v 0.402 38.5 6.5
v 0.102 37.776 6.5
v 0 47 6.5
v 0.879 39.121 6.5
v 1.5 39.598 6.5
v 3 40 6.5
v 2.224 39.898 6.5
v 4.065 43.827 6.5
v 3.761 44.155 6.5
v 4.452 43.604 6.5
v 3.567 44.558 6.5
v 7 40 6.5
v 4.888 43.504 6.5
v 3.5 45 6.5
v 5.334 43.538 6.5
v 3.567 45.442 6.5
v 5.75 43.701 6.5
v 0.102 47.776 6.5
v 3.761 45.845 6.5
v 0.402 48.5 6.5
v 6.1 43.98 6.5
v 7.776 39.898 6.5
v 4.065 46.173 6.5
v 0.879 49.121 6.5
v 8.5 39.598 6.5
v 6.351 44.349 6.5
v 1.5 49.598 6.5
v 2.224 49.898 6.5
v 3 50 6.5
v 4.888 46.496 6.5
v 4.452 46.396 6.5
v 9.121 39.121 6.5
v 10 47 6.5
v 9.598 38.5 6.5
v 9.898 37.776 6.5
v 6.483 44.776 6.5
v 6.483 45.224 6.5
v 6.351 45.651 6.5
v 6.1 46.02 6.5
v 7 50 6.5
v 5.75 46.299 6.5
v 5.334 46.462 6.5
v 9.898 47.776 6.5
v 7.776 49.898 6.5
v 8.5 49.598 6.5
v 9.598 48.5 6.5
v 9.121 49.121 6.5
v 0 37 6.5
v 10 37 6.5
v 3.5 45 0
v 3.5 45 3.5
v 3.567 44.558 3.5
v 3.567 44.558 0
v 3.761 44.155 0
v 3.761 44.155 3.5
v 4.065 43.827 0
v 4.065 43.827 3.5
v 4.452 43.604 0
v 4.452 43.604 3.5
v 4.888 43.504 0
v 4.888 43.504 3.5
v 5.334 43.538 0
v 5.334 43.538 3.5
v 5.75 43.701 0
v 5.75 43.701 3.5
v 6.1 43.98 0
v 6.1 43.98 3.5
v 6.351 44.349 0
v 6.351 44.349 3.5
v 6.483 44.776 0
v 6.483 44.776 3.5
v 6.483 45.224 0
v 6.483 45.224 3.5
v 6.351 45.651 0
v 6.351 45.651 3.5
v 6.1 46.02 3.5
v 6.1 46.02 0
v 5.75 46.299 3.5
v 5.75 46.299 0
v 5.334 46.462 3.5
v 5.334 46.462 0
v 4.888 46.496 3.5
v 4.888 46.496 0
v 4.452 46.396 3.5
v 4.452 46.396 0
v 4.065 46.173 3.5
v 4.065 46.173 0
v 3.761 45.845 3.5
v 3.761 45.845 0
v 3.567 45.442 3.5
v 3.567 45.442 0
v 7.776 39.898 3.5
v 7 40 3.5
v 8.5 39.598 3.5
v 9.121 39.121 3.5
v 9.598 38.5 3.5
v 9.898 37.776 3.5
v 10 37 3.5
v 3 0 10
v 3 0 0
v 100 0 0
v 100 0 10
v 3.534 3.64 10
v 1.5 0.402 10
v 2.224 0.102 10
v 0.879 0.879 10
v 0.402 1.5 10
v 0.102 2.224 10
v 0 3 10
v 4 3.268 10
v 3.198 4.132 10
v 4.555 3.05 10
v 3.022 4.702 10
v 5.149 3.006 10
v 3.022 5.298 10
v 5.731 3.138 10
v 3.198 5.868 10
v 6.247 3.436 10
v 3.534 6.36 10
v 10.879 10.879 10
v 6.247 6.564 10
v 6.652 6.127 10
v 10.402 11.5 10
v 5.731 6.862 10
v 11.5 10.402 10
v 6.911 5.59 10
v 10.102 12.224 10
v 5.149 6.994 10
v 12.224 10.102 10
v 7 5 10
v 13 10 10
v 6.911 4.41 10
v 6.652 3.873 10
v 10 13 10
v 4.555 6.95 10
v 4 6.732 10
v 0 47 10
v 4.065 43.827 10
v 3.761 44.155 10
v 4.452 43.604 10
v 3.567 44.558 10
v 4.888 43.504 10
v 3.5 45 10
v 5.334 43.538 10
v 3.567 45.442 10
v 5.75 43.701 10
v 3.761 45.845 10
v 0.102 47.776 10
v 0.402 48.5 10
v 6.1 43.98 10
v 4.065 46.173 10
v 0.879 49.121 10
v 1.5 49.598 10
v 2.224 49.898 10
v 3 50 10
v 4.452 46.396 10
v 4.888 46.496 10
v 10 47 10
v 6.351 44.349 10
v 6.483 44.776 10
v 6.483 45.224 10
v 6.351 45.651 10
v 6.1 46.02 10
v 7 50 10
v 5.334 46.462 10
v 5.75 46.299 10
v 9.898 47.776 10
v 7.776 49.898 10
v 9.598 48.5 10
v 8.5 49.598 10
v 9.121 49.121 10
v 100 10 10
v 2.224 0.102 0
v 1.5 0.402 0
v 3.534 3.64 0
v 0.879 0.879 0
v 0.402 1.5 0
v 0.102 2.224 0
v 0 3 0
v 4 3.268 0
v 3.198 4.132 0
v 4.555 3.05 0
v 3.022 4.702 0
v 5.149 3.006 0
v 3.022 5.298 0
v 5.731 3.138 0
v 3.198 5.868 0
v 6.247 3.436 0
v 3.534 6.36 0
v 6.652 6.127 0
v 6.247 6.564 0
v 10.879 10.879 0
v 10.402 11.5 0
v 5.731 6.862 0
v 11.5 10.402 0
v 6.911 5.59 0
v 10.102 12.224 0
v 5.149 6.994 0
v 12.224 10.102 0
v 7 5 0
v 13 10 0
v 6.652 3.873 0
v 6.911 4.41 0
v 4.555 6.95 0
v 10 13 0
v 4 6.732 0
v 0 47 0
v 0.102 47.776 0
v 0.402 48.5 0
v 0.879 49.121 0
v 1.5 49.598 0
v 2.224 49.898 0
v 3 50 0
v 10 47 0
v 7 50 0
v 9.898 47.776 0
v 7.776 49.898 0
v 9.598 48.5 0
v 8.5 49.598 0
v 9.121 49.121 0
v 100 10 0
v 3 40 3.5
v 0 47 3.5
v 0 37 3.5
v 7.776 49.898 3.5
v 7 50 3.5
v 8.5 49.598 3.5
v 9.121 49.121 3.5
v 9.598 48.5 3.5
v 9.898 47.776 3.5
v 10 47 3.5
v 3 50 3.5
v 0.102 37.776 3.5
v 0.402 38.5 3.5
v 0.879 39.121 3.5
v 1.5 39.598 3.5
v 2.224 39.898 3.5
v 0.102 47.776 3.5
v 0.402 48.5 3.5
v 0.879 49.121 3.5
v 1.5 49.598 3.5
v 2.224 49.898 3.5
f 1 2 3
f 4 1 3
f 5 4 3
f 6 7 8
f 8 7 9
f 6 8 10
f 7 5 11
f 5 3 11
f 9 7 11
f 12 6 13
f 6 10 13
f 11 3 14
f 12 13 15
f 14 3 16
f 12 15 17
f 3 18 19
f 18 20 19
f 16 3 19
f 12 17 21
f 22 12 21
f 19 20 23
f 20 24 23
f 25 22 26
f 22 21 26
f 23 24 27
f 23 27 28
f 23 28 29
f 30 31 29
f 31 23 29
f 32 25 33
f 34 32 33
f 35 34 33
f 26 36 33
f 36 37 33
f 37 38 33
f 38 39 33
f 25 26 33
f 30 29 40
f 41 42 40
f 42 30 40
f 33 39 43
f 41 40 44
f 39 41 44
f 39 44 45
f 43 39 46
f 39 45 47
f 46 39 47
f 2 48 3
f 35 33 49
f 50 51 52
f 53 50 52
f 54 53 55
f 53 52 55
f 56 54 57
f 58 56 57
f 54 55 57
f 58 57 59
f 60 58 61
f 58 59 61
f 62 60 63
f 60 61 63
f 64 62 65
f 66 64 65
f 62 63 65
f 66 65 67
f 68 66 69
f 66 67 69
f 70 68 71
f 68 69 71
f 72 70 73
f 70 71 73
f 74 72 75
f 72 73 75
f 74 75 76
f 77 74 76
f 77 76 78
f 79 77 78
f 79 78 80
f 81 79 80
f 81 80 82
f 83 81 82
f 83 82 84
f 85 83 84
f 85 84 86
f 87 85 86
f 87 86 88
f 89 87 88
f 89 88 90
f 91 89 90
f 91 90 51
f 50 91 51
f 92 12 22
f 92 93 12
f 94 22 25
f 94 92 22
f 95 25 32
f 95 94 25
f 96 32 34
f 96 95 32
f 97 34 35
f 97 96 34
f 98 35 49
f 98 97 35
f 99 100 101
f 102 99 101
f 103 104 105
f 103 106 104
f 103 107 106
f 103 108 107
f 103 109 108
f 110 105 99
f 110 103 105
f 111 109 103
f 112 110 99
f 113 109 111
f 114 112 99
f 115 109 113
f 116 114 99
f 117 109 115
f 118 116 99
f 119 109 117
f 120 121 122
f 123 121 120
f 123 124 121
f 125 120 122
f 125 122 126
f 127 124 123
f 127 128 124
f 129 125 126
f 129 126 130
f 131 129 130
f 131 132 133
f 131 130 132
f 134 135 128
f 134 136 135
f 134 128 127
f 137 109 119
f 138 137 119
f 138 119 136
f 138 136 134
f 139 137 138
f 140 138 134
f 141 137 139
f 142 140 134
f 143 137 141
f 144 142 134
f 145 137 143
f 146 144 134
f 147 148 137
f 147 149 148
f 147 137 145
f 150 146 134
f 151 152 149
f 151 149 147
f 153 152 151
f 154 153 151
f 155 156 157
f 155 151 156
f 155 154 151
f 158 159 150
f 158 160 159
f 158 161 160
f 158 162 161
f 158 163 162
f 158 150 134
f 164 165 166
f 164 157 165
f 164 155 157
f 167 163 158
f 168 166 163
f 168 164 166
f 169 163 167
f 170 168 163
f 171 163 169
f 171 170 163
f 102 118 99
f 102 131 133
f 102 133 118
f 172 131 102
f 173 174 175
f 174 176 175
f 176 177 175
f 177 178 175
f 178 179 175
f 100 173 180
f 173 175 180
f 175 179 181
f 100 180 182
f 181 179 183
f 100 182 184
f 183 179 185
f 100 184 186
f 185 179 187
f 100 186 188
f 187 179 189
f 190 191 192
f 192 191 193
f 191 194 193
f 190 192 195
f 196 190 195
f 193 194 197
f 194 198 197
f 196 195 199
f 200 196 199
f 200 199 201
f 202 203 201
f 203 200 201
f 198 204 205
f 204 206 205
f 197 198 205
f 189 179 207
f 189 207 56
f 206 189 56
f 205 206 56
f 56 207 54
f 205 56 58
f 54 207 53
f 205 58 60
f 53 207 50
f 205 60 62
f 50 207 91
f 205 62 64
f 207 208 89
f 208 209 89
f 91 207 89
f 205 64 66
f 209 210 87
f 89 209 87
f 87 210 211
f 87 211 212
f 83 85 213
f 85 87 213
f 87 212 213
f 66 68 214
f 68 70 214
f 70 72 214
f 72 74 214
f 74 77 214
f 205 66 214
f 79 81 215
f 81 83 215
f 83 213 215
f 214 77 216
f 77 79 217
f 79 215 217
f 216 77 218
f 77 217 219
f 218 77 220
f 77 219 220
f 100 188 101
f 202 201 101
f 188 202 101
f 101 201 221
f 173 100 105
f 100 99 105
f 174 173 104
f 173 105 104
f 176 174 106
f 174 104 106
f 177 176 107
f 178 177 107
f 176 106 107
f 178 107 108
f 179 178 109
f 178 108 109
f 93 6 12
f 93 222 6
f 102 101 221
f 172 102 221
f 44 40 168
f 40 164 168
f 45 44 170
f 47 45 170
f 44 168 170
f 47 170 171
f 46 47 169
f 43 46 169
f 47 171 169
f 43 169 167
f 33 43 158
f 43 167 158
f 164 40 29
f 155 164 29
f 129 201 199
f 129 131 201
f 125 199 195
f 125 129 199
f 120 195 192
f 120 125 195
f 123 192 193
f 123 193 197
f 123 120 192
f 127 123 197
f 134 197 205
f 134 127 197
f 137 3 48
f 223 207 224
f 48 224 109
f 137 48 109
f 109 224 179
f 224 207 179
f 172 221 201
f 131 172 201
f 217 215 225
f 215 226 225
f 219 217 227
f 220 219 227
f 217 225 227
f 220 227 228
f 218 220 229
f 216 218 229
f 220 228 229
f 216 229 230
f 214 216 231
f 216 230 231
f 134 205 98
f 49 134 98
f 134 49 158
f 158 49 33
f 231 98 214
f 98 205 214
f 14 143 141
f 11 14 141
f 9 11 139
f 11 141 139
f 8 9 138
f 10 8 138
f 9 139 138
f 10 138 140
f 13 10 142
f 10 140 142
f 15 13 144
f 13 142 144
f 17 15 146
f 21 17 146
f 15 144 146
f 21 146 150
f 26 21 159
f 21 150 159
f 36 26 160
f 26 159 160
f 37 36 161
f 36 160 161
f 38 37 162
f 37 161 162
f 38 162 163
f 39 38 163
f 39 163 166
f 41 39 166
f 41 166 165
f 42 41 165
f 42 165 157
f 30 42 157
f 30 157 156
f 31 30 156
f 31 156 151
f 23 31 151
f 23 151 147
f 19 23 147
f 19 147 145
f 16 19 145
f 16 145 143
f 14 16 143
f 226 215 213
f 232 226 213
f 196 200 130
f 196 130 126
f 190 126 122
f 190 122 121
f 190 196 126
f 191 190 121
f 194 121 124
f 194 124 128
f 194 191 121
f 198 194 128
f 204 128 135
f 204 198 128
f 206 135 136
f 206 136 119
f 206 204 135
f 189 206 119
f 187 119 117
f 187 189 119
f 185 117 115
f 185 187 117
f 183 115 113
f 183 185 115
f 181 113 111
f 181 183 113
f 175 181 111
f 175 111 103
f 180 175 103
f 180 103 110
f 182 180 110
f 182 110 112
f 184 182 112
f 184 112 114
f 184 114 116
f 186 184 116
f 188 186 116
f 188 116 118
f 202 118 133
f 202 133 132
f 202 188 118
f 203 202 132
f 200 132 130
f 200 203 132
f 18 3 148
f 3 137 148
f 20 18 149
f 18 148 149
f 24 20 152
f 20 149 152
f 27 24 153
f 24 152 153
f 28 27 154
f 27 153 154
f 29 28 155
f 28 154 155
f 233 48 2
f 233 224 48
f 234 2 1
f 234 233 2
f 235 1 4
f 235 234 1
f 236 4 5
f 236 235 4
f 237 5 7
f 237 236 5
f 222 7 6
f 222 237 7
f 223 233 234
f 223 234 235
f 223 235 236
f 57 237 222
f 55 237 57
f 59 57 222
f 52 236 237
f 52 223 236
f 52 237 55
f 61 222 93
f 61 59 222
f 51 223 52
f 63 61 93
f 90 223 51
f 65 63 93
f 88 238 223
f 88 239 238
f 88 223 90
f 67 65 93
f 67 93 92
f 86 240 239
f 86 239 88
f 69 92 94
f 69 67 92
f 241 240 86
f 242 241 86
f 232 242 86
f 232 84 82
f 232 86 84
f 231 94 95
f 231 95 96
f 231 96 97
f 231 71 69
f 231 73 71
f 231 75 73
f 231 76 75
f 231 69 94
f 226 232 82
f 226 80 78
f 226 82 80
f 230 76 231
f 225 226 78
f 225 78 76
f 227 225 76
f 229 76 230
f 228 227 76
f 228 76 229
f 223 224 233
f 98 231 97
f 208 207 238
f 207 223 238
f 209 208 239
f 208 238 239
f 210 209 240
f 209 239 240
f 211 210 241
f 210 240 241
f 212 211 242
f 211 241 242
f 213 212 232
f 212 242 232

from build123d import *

# Parameters (mm, degrees)
SKETCH1_R             = 2
BOSS_EXTRUDE1_DEPTH   = 10
SKETCH2_W             = 10
SKETCH2_H             = 3
CUT_EXTRUDE1_DEPTH    = 10
F_3_0MM_DOWEL_HOLE1_D = 3
FILLET2_R             = 3


with BuildPart() as part:
    # Sketch1 → Boss-Extrude1 (new body)
    with BuildSketch(Plane.XY):
        Polygon((0, 0), (100, 0), (100, 10), (10, 10), (10, 50), (0, 50), align=None)
        with Locations((5, 5)):
            Circle(SKETCH1_R, mode=Mode.SUBTRACT)
    extrude(amount=BOSS_EXTRUDE1_DEPTH)

    # Sketch2 → Cut-Extrude1 (cut)
    with BuildSketch(Plane(origin=(0, 50, 0), x_dir=(1, 0, 0), z_dir=(0, 1, 0))):
        with Locations((5, -5)):
            Rectangle(SKETCH2_W, SKETCH2_H)
    extrude(amount=-CUT_EXTRUDE1_DEPTH, mode=Mode.SUBTRACT)

    # Ø3.0mm Dowel Hole1 (through all)
    with Locations(Plane(origin=(0, 0, 0), x_dir=(1, 0, 0), z_dir=(0, 0, -1))):
        with Locations((5, -45)):
            Hole(F_3_0MM_DOWEL_HOLE1_D / 2)

    # Fillet2
    fillet2_edges = [part.edges().sort_by_distance(p)[0] for p in [
        (0, 50, 8.25),
        (10, 50, 8.25),
        (10, 10, 5),
        (0, 0, 5),
        (0, 50, 1.75),
        (10, 50, 1.75),
        (0, 40, 5),
        (10, 40, 5),
    ]]
    fillet(fillet2_edges, radius=FILLET2_R)


solid = part.part
